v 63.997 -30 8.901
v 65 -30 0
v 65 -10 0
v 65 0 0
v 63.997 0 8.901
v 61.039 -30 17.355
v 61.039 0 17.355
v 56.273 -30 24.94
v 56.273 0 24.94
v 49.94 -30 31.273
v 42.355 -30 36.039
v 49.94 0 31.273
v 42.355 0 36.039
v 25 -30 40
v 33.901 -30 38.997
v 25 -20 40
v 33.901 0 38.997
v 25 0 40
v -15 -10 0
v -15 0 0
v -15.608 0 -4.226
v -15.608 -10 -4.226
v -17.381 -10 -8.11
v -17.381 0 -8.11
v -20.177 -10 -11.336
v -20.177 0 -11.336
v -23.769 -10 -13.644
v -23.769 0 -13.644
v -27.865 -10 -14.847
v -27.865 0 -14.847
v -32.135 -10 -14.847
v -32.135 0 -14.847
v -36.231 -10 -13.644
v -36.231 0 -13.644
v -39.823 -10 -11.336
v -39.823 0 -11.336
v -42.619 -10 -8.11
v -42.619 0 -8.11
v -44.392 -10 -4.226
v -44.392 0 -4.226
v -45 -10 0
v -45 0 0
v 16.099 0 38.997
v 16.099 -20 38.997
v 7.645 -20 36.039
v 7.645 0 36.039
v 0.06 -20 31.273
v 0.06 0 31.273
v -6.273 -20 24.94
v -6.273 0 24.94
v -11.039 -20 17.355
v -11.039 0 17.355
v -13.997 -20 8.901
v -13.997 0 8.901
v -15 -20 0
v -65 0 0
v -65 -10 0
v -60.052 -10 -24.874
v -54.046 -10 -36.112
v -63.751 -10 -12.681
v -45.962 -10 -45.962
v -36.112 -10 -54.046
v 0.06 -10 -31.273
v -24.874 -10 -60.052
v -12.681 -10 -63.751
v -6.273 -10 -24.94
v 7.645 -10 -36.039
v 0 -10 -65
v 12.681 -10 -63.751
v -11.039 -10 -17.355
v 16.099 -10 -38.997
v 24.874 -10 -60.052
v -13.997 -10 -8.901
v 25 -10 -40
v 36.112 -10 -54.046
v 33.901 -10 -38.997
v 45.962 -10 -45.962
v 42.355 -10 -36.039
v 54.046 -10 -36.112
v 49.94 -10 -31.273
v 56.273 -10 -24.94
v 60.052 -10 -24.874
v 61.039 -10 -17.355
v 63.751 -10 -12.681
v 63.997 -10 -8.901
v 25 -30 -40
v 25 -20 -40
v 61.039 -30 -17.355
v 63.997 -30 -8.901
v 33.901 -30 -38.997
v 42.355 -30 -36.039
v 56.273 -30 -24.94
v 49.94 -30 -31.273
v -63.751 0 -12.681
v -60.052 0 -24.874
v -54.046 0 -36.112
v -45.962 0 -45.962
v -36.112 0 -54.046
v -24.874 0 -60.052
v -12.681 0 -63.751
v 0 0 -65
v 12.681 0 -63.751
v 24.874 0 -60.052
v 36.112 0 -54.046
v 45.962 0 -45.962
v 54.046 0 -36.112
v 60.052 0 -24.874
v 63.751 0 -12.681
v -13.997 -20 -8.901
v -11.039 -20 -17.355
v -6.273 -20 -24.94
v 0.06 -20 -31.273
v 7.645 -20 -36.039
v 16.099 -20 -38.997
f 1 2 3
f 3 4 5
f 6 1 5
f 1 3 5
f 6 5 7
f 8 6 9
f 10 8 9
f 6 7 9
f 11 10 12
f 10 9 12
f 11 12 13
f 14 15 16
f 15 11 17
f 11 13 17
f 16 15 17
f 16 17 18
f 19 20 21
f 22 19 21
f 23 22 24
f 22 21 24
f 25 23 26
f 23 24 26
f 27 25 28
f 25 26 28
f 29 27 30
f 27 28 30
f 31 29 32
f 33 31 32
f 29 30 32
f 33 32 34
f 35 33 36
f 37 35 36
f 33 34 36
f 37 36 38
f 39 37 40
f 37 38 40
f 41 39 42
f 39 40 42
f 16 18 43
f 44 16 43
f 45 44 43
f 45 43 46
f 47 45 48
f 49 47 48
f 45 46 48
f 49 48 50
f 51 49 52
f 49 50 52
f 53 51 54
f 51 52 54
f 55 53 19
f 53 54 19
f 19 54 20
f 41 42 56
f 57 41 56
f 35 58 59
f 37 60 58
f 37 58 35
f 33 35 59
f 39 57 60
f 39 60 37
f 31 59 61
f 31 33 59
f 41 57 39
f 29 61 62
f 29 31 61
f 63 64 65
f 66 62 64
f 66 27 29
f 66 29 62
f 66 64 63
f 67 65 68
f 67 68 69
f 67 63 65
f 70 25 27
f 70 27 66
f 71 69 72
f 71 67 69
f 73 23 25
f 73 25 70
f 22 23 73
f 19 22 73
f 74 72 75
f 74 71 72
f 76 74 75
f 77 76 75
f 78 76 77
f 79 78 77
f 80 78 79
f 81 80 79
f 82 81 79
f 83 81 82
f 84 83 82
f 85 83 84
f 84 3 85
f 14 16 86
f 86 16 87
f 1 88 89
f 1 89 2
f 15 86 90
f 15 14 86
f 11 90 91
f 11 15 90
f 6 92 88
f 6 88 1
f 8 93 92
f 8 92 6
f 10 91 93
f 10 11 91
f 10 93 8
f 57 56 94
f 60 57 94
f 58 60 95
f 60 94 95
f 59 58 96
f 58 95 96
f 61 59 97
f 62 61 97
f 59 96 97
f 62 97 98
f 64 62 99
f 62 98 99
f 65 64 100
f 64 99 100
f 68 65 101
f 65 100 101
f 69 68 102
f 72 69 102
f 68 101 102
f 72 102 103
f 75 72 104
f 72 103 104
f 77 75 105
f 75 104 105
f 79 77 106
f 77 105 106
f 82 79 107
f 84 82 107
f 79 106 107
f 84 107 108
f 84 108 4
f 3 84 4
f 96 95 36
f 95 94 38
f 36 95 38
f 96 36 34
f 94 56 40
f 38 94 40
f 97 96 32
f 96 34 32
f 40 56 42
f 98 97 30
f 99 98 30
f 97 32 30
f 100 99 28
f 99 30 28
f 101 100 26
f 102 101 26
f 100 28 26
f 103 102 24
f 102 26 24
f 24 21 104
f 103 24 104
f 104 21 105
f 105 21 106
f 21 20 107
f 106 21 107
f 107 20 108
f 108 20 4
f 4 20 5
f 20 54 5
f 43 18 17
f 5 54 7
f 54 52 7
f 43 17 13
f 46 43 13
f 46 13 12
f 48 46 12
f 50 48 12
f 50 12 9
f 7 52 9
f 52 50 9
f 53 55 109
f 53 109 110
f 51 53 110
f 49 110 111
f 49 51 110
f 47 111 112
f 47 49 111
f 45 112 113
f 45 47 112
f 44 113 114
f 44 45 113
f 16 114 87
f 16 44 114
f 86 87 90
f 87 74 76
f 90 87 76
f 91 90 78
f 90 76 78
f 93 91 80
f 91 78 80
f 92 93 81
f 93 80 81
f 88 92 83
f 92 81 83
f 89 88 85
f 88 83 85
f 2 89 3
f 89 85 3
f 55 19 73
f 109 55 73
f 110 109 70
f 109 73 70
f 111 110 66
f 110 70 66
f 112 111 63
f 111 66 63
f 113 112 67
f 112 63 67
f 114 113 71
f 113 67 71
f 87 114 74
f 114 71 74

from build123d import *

# Parameters (mm, degrees)
F1_DEPTH = 30
F2_DEPTH = 20
F3_DEPTH = 10


with BuildPart() as f1:
    # F0 (on Front) → F1 (new body)
    with BuildSketch(Plane.XZ):
        with BuildLine():
            ThreePointArc((50, 0), (42.67767, 17.67767), (25, 25))
            Line((25, 25), (25, 0))
            Line((25, 0), (25, -25))
            ThreePointArc((25, -25), (42.67767, -17.67767), (50, 0))
        make_face()
        with BuildLine():
            ThreePointArc((25, -40), (53.284271, -28.284271), (65, 0))
            ThreePointArc((65, 0), (53.284271, 28.284271), (25, 40))
            Line((25, 40), (25, 25))
            ThreePointArc((25, 25), (42.67767, 17.67767), (50, 0))
            ThreePointArc((50, 0), (42.67767, -17.67767), (25, -25))
            Line((25, -25), (25, -40))
        make_face()
    extrude(amount=F1_DEPTH)

    # F0 (on Front) → F2 (join)
    with BuildSketch(Plane.XZ):
        with BuildLine():
            ThreePointArc((25, 40), (-3.284271, 28.284271), (-15, 0))
            ThreePointArc((-15, 0), (-3.284271, -28.284271), (25, -40))
            Line((25, -40), (25, -25))
            ThreePointArc((25, -25), (0, 0), (25, 25))
            Line((25, 25), (25, 40))
        make_face()
        with BuildLine():
            Line((25, 0), (25, 25))
            ThreePointArc((25, 25), (0, 0), (25, -25))
            Line((25, -25), (25, 0))
        make_face()
    extrude(amount=F2_DEPTH)

    # F0 (on Front) → F3 (join)
    with BuildSketch(Plane.XZ):
        with BuildLine():
            Line((-45, 0), (-65, 0))
            ThreePointArc((-65, 0), (0, -65), (65, 0))
            ThreePointArc((65, 0), (53.284271, -28.284271), (25, -40))
            ThreePointArc((25, -40), (-3.284271, -28.284271), (-15, 0))
            ThreePointArc((-15, 0), (-30, -15), (-45, 0))
        make_face()
    extrude(amount=F3_DEPTH)


solid = f1.part
